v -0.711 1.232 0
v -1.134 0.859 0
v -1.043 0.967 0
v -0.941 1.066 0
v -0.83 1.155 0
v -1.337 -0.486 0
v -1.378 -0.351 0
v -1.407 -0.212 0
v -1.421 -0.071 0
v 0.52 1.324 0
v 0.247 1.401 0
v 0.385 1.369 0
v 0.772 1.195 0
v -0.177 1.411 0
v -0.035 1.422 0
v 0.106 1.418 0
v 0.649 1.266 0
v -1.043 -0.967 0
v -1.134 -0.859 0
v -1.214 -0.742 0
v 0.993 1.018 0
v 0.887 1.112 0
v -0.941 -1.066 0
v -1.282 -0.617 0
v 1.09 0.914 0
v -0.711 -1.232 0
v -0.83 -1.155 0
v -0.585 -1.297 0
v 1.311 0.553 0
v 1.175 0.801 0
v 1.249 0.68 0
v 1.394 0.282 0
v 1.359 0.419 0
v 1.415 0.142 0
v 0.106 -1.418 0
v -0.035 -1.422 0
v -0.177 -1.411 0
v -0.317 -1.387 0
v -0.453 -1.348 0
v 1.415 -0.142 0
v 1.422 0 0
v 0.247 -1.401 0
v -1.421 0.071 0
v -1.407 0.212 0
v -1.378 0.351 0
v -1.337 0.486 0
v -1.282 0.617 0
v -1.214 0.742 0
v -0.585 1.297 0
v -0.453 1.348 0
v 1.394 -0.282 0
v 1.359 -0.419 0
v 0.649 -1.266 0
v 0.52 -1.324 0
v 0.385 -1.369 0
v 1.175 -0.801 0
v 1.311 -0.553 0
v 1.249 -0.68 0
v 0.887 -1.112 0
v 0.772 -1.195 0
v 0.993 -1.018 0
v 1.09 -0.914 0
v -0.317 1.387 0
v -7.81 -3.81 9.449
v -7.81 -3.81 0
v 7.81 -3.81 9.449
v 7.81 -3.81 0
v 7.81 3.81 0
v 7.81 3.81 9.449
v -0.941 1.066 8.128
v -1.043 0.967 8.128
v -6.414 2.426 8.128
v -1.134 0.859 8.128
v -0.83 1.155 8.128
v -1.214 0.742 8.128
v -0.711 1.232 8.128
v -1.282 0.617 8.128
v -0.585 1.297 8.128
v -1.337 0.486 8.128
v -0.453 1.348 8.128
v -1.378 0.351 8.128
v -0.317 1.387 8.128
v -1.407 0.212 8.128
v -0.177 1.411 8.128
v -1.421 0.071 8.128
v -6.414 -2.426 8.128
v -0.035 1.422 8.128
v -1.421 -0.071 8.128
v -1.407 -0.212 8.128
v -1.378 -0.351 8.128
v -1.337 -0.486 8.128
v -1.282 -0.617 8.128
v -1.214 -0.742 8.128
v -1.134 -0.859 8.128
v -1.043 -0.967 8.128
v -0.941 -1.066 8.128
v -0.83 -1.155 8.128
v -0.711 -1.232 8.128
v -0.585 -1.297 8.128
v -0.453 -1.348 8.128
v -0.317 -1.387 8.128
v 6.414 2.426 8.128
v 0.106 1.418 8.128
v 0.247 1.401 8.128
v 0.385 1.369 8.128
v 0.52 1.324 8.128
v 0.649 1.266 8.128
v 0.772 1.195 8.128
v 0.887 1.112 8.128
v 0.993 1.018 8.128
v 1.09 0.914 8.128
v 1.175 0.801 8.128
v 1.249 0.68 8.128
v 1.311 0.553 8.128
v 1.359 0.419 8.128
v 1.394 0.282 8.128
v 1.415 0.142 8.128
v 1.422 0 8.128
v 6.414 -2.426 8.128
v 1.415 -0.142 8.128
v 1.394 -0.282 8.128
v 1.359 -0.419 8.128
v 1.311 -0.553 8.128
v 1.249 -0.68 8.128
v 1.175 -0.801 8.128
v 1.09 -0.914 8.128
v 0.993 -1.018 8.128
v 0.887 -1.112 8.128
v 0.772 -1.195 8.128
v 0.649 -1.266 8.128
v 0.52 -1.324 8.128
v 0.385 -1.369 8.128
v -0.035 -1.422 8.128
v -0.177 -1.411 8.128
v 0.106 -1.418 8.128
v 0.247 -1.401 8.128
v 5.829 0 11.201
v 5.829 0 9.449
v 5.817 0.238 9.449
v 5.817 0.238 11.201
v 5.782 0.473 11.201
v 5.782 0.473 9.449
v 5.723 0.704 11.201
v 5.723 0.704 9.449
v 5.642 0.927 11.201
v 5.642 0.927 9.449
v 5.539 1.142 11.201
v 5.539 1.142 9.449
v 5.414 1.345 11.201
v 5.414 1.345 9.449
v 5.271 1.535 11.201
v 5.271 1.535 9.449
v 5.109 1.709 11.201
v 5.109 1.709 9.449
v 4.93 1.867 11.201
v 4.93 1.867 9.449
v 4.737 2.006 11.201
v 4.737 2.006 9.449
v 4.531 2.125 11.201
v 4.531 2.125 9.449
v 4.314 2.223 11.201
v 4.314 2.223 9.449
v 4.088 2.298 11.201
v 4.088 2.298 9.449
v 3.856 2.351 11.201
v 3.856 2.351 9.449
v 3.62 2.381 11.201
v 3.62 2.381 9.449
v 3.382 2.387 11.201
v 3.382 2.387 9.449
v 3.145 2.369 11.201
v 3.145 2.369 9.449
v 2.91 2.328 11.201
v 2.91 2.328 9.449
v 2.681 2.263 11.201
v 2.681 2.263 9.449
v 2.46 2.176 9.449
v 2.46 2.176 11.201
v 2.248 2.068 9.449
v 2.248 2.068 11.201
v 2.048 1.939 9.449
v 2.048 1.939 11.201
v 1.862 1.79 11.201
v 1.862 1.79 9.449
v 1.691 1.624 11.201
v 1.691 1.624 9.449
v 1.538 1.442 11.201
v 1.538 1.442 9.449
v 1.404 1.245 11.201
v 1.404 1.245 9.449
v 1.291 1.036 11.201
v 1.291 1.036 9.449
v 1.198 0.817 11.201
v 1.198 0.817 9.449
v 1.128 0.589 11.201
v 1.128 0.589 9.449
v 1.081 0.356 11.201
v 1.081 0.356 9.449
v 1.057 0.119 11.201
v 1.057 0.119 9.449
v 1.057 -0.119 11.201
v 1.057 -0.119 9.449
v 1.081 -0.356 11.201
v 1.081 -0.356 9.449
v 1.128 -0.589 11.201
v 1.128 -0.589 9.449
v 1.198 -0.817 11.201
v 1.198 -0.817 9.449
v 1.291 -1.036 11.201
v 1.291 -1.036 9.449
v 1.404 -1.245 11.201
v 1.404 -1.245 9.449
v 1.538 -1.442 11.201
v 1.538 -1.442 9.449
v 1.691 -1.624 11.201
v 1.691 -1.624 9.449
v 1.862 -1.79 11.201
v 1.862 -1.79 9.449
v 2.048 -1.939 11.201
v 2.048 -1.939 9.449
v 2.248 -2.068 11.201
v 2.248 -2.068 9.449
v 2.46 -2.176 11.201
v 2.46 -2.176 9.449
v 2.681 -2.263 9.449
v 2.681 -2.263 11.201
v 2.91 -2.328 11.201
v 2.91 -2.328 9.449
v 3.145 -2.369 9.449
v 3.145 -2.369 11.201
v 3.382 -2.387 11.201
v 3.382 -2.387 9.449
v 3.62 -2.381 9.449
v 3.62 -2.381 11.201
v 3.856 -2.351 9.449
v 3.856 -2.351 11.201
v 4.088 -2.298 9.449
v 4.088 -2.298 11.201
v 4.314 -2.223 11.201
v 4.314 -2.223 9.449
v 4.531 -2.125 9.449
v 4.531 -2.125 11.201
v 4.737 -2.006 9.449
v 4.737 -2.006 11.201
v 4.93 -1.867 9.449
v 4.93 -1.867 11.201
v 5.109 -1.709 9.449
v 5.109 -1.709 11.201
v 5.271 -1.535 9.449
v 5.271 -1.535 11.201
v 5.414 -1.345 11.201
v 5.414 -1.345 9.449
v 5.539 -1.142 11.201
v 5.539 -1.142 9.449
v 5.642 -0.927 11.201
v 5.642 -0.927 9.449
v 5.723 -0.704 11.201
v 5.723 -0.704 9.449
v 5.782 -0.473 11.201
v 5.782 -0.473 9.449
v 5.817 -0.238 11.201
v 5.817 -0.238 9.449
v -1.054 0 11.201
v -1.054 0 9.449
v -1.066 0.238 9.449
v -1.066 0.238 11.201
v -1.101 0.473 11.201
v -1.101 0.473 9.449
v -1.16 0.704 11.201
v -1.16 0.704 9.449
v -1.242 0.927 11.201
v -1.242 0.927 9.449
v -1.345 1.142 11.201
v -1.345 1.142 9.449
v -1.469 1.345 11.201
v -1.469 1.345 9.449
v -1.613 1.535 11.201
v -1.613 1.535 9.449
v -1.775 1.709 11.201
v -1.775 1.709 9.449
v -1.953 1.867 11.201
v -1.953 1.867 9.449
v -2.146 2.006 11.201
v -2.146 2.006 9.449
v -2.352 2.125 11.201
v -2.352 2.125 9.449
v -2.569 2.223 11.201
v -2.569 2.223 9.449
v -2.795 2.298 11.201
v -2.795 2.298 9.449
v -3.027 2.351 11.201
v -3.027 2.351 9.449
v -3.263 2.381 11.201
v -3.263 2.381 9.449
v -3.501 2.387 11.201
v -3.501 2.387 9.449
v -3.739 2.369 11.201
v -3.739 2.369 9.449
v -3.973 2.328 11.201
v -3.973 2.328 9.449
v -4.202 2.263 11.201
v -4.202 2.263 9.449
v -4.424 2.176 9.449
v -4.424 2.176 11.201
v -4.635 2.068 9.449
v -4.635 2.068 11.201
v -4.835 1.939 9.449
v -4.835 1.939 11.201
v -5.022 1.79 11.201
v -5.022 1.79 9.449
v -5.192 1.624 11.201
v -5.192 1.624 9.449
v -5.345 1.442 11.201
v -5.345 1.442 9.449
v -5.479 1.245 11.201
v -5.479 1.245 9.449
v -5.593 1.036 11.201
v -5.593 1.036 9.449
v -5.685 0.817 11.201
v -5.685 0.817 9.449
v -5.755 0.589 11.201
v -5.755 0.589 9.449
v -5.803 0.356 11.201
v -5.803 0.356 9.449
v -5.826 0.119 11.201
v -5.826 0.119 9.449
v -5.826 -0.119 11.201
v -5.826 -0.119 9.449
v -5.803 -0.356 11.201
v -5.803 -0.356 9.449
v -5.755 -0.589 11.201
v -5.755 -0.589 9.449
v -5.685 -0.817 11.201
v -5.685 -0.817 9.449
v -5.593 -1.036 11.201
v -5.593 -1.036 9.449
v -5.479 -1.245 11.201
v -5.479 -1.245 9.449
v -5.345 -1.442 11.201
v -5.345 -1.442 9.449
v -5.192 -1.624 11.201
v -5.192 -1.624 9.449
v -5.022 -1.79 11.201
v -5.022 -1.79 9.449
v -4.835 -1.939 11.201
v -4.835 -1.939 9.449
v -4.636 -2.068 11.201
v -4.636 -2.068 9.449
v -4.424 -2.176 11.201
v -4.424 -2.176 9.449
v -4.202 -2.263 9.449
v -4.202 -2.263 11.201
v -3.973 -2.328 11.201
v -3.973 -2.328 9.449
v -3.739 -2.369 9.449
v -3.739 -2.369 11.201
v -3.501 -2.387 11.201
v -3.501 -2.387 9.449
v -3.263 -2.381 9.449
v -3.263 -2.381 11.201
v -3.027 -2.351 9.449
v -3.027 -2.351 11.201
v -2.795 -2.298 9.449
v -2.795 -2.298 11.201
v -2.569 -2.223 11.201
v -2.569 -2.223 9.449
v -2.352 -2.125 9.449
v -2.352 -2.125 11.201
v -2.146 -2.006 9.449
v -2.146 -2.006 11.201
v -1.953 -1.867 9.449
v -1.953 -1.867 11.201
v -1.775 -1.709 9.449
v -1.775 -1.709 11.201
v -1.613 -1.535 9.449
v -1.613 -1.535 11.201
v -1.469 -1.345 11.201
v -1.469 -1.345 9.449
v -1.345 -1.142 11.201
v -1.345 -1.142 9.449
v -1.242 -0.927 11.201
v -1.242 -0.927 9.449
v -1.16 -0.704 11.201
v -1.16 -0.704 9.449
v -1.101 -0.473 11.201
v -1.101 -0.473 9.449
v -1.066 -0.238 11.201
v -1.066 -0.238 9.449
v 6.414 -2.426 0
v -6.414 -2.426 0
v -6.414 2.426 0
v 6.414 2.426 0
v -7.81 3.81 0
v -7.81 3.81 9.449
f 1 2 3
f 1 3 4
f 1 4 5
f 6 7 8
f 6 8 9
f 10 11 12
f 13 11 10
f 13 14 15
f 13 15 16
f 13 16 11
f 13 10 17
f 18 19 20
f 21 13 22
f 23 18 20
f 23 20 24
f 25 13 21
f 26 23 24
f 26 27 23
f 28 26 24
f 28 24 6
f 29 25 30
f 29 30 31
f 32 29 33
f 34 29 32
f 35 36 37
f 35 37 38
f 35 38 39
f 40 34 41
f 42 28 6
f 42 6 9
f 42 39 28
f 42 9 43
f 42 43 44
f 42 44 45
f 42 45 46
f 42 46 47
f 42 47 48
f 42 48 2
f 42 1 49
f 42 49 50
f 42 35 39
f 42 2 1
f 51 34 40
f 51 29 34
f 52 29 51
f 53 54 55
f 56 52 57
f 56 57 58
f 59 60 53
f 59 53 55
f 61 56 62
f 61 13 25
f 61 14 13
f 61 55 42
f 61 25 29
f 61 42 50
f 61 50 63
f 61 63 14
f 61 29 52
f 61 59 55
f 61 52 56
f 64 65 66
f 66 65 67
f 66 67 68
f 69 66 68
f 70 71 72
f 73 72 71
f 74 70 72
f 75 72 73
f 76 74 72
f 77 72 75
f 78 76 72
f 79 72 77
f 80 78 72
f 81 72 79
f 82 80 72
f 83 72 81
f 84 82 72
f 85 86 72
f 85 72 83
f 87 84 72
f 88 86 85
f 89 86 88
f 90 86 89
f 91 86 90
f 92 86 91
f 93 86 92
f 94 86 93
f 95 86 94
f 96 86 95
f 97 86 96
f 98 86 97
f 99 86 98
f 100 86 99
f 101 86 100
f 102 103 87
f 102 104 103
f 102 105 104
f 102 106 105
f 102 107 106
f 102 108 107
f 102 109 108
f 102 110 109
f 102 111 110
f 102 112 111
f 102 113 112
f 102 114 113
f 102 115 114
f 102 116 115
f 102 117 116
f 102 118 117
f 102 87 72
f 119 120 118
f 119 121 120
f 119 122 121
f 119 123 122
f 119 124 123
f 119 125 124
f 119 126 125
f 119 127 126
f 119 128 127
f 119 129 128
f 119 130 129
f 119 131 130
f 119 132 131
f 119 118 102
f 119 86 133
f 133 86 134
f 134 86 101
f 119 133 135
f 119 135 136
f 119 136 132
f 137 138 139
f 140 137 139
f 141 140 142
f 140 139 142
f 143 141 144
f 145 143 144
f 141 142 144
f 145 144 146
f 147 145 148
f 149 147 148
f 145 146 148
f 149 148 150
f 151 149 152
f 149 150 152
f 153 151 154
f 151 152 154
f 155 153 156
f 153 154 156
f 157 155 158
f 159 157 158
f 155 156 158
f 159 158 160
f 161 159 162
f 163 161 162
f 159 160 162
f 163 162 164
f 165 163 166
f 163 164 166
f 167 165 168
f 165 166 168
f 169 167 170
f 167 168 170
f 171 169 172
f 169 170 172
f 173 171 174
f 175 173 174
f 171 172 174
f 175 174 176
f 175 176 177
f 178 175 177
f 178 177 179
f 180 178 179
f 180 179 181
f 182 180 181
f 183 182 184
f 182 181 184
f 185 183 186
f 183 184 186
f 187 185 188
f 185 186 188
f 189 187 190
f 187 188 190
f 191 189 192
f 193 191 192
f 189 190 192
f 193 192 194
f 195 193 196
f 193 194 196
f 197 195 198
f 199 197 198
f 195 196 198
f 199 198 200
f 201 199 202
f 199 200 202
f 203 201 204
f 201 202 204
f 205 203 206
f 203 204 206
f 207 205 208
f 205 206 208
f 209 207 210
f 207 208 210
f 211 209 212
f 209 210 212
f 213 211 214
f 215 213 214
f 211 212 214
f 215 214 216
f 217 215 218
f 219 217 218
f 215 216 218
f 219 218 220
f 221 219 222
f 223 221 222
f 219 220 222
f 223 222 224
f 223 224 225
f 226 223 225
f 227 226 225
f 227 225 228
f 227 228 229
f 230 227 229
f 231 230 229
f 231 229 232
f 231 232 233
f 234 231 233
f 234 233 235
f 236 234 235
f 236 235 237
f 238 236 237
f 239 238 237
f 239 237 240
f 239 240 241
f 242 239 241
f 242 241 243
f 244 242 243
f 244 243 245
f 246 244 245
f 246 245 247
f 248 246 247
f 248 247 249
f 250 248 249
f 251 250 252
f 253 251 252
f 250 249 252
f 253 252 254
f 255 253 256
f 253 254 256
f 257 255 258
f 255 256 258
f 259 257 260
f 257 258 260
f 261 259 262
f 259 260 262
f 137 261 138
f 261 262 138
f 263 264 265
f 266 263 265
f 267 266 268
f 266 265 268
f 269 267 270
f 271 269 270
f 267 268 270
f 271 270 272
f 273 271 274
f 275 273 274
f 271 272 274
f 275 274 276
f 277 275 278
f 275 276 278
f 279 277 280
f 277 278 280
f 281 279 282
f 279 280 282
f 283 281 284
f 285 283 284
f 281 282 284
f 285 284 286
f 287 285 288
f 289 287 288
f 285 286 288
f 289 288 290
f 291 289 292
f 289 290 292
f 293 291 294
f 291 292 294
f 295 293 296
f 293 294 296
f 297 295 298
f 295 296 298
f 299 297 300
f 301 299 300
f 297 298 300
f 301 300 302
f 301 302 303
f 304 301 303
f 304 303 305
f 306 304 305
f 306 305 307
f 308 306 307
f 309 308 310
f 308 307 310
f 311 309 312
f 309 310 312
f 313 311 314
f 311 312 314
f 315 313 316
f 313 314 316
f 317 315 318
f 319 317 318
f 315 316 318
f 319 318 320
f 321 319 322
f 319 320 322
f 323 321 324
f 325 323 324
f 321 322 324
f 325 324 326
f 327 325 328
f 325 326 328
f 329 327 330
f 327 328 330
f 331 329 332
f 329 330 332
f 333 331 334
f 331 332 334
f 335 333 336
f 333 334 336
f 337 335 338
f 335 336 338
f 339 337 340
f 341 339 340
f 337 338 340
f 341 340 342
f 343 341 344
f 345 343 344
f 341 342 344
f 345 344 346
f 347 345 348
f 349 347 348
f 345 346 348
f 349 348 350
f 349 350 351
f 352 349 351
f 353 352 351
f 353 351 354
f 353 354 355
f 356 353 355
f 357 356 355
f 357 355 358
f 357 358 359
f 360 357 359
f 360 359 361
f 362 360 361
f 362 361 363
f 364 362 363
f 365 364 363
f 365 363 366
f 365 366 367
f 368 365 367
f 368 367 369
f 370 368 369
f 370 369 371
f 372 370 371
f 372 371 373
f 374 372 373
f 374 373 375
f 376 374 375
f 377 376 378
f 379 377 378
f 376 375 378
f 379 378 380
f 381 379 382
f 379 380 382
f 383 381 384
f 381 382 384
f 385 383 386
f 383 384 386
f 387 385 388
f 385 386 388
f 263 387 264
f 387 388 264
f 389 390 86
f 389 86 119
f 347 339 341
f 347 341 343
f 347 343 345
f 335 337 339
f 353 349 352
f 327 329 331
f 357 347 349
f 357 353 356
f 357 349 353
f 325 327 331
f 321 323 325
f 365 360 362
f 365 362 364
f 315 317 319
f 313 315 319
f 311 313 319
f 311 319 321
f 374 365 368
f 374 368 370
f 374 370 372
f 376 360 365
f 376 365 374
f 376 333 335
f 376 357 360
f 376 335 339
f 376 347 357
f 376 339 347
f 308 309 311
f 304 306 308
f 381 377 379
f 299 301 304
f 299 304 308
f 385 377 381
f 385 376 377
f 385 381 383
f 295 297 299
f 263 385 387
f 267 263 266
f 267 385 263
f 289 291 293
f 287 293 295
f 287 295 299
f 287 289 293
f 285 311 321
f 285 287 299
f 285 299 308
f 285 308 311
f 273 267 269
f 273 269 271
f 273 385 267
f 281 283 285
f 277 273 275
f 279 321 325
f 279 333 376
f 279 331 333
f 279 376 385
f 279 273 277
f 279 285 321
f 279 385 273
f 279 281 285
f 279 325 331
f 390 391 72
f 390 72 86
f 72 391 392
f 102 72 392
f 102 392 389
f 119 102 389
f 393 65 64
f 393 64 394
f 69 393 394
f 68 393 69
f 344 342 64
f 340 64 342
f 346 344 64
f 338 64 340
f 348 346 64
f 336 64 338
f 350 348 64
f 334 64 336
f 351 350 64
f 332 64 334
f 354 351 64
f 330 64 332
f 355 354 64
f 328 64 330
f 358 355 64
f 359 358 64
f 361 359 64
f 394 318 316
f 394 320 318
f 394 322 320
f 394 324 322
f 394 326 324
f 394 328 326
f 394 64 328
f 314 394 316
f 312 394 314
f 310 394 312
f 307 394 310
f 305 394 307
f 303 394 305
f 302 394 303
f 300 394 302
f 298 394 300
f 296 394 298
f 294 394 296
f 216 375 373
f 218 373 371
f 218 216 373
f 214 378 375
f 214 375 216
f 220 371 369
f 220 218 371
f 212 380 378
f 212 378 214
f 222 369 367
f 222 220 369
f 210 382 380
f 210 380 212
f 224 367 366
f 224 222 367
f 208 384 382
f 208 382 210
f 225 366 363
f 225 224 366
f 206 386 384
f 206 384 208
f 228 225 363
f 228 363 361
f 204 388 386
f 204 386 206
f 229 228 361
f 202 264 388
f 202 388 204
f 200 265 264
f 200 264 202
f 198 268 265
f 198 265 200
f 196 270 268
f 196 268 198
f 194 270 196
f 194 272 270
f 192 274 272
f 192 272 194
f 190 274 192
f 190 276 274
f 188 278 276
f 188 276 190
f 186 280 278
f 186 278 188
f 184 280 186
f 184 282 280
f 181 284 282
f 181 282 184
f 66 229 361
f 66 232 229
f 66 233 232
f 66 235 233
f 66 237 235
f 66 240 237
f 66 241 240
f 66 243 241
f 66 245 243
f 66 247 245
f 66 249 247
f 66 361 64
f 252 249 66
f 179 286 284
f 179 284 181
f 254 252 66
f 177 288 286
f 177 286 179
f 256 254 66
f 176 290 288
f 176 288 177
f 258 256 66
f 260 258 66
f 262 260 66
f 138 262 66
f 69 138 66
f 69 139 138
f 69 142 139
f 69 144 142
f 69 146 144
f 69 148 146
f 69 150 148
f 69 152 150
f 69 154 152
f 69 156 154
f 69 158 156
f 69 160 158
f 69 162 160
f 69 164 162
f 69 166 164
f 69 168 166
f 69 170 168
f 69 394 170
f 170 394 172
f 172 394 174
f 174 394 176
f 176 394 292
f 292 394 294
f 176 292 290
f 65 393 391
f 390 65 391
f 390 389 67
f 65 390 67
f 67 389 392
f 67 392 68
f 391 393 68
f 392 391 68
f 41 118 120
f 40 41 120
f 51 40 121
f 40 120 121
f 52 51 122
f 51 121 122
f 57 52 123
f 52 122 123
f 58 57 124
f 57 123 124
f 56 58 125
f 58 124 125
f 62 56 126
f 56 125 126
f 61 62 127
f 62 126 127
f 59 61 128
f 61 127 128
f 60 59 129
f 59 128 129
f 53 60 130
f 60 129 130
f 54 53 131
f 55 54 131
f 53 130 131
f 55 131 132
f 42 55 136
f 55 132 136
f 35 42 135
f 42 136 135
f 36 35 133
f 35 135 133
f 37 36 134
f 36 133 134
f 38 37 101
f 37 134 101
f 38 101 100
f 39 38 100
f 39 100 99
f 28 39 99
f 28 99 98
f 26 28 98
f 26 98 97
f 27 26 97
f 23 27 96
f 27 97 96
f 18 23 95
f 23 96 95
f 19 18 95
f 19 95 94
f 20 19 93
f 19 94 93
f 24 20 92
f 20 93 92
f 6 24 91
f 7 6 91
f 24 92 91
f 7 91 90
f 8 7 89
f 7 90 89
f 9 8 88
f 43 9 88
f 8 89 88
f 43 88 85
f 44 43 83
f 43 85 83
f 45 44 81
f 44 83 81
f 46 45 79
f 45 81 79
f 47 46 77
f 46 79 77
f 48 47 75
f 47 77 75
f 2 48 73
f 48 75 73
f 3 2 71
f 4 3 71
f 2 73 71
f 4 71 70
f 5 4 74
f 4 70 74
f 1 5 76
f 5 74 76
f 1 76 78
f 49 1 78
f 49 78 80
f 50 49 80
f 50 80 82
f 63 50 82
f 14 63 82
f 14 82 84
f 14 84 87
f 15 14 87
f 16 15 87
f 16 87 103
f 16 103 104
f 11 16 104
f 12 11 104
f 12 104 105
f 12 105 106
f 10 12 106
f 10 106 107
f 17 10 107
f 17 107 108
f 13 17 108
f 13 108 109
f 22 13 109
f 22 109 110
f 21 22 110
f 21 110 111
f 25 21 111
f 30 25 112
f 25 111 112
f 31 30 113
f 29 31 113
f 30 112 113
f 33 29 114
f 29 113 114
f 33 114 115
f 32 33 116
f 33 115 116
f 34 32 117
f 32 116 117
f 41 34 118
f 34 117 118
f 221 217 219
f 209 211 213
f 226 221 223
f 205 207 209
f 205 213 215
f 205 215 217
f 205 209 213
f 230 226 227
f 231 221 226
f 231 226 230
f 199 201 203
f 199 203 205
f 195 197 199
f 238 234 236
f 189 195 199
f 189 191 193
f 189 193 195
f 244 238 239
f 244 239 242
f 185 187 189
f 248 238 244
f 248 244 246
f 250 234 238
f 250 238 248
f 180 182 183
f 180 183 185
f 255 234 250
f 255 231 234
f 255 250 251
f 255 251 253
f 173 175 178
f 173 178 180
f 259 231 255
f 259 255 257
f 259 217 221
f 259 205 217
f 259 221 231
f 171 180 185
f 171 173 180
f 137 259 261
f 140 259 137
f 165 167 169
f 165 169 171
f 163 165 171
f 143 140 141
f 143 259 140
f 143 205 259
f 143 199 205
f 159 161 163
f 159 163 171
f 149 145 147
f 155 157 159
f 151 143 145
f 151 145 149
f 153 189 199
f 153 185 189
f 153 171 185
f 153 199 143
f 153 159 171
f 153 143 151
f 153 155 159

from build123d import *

# Parameters (mm, degrees)
F0_W     = 15.621
F0_H     = 7.62
F1_DEPTH = 9.4488
F2_R     = 2.3876
F3_DEPTH = 1.7526
F4_W     = 12.827
F4_H     = 4.8514
F5_DEPTH = 8.128
F6_R     = 1.4224
F7_DEPTH = 8.128


with BuildPart() as f1:
    # F0 (on Top) → F1 (new body)
    with BuildSketch(Plane.XY):
        Rectangle(F0_W, F0_H)
    extrude(amount=F1_DEPTH)

    # F2 (on face) → F3 (join)
    with BuildSketch(Plane.XY.offset(9.4488)):
        with Locations((-3.4417, 0)):
            Circle(F2_R)
        with Locations((3.4417, 0)):
            Circle(F2_R)
    extrude(amount=F3_DEPTH)

    # F4 (on face) → F5 (cut)
    with BuildSketch(Plane(origin=(0, 0, 0), x_dir=(1, 0, 0), z_dir=(0, 0, -1))):
        Rectangle(F4_W, F4_H)
    extrude(amount=-F5_DEPTH, mode=Mode.SUBTRACT)

    # F6 (on face) → F7 (join)
    with BuildSketch(Plane(origin=(0, 0, 8.128), x_dir=(1, 0, 0), z_dir=(0, 0, -1))):
        Circle(F6_R)
    extrude(amount=F7_DEPTH)


solid = f1.part
